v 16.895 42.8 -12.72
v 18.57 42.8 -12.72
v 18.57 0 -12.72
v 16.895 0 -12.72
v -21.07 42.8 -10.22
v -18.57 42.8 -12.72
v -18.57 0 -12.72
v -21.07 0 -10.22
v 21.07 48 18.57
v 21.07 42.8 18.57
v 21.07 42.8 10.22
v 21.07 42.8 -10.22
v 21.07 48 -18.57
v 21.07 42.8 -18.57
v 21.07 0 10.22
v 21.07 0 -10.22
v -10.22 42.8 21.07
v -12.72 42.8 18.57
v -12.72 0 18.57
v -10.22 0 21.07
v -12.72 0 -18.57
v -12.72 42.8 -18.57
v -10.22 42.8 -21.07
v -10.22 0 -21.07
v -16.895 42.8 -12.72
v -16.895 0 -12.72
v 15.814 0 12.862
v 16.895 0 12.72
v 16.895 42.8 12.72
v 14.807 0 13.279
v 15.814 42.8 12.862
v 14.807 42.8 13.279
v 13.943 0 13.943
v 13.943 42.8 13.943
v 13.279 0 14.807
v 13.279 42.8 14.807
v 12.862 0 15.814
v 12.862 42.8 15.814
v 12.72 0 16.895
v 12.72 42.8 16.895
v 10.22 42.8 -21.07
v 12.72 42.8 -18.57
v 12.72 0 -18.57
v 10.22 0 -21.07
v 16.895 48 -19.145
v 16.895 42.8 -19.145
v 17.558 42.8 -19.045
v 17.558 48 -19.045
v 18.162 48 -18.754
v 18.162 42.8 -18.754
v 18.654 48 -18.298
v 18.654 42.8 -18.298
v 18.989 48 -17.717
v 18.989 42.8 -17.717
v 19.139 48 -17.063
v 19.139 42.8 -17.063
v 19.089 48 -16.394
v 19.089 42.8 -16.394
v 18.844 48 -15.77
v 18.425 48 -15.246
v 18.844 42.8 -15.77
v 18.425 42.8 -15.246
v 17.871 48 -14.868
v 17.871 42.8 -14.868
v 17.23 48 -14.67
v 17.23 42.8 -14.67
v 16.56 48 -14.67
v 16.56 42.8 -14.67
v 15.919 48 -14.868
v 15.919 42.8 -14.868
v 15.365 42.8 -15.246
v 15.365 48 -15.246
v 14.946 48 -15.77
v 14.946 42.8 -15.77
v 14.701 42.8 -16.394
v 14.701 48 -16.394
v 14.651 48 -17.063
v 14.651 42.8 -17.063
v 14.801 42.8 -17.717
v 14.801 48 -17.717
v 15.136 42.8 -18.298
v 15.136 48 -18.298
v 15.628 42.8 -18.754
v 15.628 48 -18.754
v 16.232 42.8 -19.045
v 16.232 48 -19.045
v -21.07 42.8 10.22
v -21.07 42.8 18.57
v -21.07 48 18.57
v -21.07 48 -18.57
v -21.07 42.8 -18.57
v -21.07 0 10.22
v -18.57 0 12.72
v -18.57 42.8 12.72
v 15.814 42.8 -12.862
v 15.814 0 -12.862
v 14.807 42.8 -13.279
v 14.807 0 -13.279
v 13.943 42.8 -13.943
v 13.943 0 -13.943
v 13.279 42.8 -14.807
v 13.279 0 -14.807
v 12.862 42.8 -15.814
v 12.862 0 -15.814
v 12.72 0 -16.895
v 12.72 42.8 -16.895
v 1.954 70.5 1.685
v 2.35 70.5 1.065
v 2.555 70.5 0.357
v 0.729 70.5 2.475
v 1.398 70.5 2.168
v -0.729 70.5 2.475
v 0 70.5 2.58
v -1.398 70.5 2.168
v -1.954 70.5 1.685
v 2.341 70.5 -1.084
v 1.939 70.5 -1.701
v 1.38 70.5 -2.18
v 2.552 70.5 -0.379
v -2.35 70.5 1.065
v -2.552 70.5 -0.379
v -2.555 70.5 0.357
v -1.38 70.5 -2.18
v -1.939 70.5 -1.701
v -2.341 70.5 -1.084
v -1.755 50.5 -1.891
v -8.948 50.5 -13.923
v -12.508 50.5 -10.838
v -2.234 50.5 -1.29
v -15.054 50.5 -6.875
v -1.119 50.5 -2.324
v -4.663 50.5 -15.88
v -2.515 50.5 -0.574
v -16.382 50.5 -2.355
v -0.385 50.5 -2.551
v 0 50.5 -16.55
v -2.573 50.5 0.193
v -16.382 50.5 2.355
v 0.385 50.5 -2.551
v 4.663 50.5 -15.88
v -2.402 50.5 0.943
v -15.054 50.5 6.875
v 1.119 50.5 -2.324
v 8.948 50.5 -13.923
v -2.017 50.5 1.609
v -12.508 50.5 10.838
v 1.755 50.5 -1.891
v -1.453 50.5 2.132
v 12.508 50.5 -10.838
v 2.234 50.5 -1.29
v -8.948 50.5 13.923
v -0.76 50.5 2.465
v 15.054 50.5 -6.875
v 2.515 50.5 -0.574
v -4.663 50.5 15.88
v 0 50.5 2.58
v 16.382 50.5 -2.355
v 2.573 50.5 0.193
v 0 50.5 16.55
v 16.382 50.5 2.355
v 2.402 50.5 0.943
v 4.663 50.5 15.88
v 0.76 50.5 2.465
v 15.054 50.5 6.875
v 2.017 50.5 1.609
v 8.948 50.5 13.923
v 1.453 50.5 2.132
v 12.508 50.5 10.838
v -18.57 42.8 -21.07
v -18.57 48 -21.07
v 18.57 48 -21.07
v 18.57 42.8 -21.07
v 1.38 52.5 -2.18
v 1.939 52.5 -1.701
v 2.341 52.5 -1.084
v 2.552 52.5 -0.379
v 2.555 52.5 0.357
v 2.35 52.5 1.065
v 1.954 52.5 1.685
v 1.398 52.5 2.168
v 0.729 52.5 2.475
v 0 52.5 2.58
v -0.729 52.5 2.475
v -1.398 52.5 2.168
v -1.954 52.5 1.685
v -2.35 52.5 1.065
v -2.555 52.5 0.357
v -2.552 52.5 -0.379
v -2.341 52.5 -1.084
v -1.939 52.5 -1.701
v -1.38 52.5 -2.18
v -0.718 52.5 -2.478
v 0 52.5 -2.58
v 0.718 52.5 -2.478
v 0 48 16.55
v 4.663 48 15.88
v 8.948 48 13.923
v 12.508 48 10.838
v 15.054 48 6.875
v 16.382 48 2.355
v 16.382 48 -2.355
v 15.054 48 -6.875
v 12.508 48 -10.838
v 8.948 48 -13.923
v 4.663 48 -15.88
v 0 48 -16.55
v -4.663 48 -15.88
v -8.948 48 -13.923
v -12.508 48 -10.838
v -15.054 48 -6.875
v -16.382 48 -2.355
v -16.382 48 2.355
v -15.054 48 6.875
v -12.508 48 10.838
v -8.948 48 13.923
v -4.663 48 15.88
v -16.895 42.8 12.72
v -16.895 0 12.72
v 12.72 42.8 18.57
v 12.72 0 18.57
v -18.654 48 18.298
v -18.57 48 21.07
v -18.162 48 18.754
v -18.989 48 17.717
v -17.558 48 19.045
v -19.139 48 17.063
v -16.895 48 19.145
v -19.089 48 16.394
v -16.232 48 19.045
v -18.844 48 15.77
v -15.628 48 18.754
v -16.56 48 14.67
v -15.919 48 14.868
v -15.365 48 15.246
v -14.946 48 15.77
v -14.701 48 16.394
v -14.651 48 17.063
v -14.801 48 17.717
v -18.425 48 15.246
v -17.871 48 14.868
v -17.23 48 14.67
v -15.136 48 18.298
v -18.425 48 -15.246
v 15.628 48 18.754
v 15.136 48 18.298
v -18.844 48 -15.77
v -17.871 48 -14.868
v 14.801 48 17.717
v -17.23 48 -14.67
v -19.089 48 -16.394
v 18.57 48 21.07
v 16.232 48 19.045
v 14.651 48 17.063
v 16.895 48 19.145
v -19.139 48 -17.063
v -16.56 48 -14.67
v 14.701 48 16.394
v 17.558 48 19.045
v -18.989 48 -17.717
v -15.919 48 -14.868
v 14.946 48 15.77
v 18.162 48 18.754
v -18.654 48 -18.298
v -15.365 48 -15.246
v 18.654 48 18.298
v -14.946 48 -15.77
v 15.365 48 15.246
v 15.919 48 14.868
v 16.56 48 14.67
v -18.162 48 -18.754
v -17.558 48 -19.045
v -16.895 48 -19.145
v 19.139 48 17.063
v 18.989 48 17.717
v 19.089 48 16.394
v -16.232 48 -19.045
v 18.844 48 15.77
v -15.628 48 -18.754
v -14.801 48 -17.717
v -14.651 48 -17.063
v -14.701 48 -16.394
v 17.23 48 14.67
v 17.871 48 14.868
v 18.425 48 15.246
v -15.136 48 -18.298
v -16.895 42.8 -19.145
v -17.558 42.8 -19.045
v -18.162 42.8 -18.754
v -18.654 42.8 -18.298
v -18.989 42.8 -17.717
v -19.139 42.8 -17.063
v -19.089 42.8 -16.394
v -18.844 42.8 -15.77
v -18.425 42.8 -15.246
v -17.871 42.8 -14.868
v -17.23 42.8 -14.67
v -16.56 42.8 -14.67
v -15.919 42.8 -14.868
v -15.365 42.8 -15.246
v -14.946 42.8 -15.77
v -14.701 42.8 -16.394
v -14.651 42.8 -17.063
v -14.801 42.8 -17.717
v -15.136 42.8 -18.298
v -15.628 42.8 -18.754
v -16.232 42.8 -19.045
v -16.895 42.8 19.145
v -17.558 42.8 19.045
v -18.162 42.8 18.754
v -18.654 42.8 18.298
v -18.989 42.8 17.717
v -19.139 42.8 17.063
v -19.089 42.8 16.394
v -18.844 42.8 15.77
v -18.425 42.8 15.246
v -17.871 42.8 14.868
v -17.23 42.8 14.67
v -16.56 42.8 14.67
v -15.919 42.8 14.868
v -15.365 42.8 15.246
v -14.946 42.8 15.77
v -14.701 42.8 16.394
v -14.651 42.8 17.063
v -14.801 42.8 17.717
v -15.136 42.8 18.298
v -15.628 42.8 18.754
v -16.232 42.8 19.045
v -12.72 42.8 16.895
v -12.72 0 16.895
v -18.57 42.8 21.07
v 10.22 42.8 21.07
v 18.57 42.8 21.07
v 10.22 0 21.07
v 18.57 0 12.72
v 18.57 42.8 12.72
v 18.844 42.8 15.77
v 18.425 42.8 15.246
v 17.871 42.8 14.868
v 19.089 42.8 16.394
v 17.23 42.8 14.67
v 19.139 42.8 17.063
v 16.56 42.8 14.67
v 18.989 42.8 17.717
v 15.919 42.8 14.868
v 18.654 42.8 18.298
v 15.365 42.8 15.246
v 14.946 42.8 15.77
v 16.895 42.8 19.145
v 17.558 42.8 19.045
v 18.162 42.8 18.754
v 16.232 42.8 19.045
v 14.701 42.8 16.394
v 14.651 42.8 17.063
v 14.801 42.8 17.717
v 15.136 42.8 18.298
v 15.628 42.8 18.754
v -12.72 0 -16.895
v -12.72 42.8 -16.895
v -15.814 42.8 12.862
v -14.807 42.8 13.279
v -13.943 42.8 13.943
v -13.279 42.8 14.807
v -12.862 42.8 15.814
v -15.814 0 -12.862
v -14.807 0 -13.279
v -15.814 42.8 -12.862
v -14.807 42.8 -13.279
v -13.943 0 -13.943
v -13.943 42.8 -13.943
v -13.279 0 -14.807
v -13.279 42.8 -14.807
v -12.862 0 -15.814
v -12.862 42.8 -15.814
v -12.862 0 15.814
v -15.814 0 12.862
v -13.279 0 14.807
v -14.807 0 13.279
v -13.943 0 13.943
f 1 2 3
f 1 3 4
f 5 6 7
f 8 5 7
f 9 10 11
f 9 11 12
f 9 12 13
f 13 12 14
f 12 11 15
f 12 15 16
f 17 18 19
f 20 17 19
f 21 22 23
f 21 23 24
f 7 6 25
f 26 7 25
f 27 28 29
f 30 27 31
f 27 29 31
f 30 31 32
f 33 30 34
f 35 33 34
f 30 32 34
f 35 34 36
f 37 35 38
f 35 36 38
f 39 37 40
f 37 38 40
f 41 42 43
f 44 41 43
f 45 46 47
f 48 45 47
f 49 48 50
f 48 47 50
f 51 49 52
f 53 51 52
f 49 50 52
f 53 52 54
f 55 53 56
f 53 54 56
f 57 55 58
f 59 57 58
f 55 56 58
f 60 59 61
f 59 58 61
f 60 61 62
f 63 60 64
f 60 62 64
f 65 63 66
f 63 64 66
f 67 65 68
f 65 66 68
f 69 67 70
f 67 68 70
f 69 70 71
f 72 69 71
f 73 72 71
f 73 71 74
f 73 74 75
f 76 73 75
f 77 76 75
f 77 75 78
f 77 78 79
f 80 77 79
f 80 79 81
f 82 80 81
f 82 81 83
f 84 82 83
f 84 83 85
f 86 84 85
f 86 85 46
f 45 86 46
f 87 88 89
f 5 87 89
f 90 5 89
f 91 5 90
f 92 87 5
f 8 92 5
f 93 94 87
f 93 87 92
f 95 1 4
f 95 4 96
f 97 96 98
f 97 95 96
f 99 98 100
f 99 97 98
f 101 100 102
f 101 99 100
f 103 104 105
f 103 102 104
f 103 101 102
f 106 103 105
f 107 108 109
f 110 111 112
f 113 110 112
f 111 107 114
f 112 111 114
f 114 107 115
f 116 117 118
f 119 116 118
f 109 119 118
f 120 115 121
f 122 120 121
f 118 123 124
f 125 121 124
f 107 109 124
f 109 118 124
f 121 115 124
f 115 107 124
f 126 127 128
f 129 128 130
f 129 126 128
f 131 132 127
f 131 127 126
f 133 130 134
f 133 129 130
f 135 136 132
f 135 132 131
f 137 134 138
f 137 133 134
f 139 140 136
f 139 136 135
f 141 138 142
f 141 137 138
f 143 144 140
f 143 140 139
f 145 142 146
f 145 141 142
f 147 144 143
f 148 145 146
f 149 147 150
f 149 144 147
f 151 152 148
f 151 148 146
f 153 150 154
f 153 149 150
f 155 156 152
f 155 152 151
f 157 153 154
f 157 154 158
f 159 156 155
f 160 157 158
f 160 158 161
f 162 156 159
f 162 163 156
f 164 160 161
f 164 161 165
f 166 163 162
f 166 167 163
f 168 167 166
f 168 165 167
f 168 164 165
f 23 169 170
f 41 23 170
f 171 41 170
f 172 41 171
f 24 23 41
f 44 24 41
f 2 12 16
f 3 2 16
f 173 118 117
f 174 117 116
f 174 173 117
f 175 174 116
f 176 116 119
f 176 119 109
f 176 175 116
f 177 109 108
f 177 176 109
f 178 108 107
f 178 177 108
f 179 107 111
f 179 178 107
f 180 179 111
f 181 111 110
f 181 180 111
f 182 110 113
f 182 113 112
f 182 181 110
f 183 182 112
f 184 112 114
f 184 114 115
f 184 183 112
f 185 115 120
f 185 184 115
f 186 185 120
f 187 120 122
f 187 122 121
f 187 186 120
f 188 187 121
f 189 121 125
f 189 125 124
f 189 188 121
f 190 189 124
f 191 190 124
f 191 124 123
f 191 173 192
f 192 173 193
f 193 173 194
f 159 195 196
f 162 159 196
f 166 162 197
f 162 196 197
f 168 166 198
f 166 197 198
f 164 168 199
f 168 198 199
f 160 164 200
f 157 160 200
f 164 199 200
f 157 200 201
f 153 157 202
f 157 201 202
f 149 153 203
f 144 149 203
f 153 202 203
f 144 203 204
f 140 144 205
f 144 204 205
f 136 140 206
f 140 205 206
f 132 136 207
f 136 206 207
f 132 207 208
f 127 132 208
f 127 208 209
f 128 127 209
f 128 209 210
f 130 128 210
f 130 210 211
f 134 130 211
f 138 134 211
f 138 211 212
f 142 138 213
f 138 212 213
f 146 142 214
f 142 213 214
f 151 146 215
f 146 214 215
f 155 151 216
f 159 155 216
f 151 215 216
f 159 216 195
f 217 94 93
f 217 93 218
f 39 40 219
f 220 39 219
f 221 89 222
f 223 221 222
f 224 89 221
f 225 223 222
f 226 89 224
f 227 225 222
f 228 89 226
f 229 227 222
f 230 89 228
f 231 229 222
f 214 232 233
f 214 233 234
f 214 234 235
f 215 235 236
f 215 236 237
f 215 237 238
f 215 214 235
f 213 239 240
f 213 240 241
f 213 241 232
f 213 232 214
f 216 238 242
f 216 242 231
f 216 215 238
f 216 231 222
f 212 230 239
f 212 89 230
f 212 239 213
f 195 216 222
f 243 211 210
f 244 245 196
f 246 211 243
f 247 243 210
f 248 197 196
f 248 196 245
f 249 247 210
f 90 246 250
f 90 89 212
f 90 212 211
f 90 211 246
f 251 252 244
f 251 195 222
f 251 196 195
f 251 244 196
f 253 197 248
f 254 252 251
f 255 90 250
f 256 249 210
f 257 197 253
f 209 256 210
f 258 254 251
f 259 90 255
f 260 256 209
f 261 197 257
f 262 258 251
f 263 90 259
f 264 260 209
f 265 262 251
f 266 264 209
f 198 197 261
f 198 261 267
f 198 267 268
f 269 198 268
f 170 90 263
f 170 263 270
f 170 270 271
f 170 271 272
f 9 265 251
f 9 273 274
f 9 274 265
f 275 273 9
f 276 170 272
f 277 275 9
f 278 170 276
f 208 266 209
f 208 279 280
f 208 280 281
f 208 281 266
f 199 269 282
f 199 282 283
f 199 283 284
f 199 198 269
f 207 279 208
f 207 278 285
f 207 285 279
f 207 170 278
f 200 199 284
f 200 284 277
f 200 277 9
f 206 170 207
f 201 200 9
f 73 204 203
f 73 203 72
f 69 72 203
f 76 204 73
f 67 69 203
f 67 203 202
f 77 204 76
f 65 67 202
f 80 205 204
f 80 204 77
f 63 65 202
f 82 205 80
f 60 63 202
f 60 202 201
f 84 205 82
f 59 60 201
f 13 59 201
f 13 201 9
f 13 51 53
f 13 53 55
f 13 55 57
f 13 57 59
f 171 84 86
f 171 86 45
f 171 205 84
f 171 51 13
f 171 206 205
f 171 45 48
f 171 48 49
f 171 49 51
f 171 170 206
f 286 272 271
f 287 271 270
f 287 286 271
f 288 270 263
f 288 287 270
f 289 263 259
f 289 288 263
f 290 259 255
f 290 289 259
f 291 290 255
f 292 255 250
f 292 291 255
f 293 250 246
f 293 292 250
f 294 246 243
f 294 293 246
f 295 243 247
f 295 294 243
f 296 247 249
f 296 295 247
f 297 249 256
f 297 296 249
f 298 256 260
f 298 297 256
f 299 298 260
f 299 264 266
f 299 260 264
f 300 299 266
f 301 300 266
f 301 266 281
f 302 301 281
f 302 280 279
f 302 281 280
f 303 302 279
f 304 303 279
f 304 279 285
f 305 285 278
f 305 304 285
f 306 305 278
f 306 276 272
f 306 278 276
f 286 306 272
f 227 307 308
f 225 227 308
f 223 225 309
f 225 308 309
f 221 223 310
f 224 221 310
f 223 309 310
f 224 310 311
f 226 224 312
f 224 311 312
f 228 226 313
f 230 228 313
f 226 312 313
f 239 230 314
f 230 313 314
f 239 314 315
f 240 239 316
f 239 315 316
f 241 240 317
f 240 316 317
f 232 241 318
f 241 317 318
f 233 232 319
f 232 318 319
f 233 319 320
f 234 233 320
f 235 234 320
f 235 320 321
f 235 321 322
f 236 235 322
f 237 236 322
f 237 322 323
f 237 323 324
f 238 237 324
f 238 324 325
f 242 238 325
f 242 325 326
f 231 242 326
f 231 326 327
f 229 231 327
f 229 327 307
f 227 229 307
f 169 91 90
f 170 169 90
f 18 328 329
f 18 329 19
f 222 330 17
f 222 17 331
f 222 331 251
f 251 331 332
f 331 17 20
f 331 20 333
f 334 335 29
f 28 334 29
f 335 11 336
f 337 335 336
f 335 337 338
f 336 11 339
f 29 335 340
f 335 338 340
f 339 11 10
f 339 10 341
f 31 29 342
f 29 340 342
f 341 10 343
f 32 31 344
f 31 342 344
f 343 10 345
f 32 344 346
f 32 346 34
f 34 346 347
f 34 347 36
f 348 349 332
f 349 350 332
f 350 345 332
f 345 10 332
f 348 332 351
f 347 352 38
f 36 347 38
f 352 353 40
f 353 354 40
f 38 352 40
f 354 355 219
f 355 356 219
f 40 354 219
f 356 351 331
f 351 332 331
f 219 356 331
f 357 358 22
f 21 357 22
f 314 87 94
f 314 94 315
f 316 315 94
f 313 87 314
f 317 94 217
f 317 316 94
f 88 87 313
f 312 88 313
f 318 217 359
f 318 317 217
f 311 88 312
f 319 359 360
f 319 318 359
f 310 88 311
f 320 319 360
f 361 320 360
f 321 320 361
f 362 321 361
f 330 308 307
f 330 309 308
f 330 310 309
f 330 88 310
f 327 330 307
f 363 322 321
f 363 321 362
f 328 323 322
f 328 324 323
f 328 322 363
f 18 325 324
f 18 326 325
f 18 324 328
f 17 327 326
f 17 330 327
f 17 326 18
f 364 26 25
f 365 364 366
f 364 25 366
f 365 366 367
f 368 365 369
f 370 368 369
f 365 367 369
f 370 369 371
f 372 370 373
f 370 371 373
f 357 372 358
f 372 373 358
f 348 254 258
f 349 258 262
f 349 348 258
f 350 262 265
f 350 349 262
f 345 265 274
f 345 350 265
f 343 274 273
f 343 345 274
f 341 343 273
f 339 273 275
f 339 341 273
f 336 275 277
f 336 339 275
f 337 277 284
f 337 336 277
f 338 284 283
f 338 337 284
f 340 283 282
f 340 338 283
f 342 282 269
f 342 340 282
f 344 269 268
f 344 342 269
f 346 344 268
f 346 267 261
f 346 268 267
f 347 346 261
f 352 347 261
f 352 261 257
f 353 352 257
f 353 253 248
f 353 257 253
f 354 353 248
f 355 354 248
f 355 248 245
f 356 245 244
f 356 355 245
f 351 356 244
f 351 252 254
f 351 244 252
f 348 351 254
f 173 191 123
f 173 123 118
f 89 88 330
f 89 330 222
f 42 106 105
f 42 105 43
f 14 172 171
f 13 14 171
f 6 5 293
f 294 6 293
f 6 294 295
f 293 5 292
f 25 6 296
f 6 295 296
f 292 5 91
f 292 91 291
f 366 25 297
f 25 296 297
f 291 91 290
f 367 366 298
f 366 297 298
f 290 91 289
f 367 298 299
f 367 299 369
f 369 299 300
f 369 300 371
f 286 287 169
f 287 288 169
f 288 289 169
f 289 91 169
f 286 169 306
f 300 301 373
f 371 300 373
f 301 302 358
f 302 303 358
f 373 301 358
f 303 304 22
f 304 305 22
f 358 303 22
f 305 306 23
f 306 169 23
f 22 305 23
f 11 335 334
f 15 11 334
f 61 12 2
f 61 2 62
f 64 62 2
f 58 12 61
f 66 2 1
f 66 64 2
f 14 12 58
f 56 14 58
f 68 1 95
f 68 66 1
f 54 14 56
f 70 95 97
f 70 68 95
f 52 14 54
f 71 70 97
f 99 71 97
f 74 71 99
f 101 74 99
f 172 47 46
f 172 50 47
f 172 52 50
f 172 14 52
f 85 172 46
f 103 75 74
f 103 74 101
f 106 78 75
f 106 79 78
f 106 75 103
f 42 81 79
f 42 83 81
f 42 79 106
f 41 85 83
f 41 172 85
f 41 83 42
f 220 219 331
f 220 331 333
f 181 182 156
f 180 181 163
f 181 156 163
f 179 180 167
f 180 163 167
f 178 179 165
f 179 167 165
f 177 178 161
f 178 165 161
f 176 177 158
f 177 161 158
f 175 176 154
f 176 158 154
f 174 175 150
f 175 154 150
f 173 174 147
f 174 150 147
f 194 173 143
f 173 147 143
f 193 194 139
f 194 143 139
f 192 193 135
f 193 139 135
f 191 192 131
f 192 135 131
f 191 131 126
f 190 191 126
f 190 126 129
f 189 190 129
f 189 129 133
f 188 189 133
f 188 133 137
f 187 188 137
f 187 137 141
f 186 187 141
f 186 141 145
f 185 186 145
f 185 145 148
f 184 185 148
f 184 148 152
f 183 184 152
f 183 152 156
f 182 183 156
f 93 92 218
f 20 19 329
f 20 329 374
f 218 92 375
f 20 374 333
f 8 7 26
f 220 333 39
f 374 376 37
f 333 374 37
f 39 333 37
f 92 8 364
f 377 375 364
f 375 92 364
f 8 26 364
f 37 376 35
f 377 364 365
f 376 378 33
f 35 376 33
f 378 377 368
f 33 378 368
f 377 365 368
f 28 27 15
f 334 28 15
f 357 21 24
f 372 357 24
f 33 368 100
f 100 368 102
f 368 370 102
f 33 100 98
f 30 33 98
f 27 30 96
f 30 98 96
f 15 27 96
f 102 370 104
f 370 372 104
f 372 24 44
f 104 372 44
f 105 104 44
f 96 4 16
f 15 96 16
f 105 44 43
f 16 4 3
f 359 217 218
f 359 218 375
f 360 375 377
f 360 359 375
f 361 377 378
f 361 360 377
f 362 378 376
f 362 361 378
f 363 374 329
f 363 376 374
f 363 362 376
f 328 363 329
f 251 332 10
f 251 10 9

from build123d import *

# Parameters (mm, degrees)
CROQUIS1_W                                 = 42.14
CROQUIS1_H                                 = 42.14
SALIENTE_EXTRUIR1_DEPTH                    = 48
CORTAR_EXTRUIR1_DEPTH                      = 53.151029
SIMETR_A3_AT_THE_SECOND_PLANE_COPY_1_DEPTH = 53.151029
CHAFL_N1_SIZE                              = 2.5
CROQUIS3_R                                 = 2.25
CORTAR_EXTRUIR2_DEPTH                      = 53.151029
SIMETR_A4_AT_THE_SECOND_PLANE_COPY_1_SKE_R = 2.25
SIMETR_A4_AT_THE_SECOND_PLANE_COPY_1_DEPTH = 53.151029
CROQUIS4_R                                 = 16.55
SALIENTE_EXTRUIR2_DEPTH                    = 2.5
CROQUIS6_R                                 = 2.58
SALIENTE_EXTRUIR4_DEPTH                    = 2
SALIENTE_EXTRUIR5_DEPTH                    = 18
SALIENTE_EXTRUIR3_DEPTH                    = 20
CHAFL_N2_SIZE                              = 2.5


with BuildPart() as part:
    # Croquis1 → Saliente-Extruir1 (new body)
    with BuildSketch(Plane(origin=(0, 0, 0), x_dir=(1, 0, 0), z_dir=(0, 1, 0))):
        Rectangle(CROQUIS1_W, CROQUIS1_H)
    extrude(amount=SALIENTE_EXTRUIR1_DEPTH)

    # Croquis2 → Cortar-Extruir1 (cut, through all)
    with BuildSketch(Plane(origin=(0, 42.8, 0), x_dir=(1, 0, 0), z_dir=(0, 1, 0))):
        with BuildLine():
            Line((-21.07, 12.72), (-16.895, 12.72))
            ThreePointArc((-16.895, 12.72), (-13.942829, 13.942829), (-12.72, 16.895))
            Line((-12.72, 16.895), (-12.72, 21.07))
            Line((-12.72, 21.07), (-21.07, 21.07))
            Line((-21.07, 21.07), (-21.07, 12.72))
        make_face()
    cortar_extruir1 = extrude(amount=-CORTAR_EXTRUIR1_DEPTH, mode=Mode.SUBTRACT)

    # Simetría3: Cortar-Extruir1 across plane
    add(cortar_extruir1.mirror(Plane(origin=(0, 0, 0), x_dir=(0, 0, 1), z_dir=(1, 0, 0))), mode=Mode.SUBTRACT)

    # Simetría3 at the second plane: Cortar-Extruir1 across plane
    add(cortar_extruir1.mirror(Plane.XY), mode=Mode.SUBTRACT)

    # Simetría3 at the second plane copy 1 ske → Simetría3 at the second plane copy 1 (cut, through all)
    with BuildSketch(Plane(origin=(0, 42.8, 0), x_dir=(-1, 0, 0), z_dir=(0, 1, 0))):
        with BuildLine():
            Line((-21.07, 12.72), (-16.895, 12.72))
            ThreePointArc((-16.895, 12.72), (-13.942829, 13.942829), (-12.72, 16.895))
            Line((-12.72, 16.895), (-12.72, 21.07))
            Line((-12.72, 21.07), (-21.07, 21.07))
            Line((-21.07, 21.07), (-21.07, 12.72))
        make_face()
    extrude(amount=-SIMETR_A3_AT_THE_SECOND_PLANE_COPY_1_DEPTH, mode=Mode.SUBTRACT)

    # Chaflán1
    chafl_n1_edges = [part.edges().sort_by_distance(p)[0] for p in [
        (-21.07, 21.4, -12.72),
        (-12.72, 21.4, -21.07),
        (-21.07, 21.4, 12.72),
        (-12.72, 21.4, 21.07),
        (21.07, 21.4, -12.72),
        (12.72, 21.4, -21.07),
        (21.07, 21.4, 12.72),
        (12.72, 21.4, 21.07),
    ]]
    chamfer(chafl_n1_edges, length=CHAFL_N1_SIZE)

    # Croquis3 → Cortar-Extruir2 (cut, through all)
    with BuildSketch(Plane.XZ.offset(-42.8)):
        with Locations(Location((16.895, -16.895, 0), (0, 0, 270))):
            Circle(CROQUIS3_R)
    cortar_extruir2 = extrude(amount=-CORTAR_EXTRUIR2_DEPTH, mode=Mode.SUBTRACT)

    # Simetría4: Cortar-Extruir2 across plane
    add(cortar_extruir2.mirror(Plane(origin=(0, 0, 0), x_dir=(0, 0, 1), z_dir=(1, 0, 0))), mode=Mode.SUBTRACT)

    # Simetría4 at the second plane: Cortar-Extruir2 across plane
    add(cortar_extruir2.mirror(Plane.XY), mode=Mode.SUBTRACT)

    # Simetría4 at the second plane copy 1 ske → Simetría4 at the second plane copy 1 (cut, through all)
    with BuildSketch(Plane(origin=(0, 42.8, 0), x_dir=(-1, 0, 0), z_dir=(0, -1, 0))):
        with Locations(Location((16.895, -16.895, 0), (0, 0, 270))):
            Circle(SIMETR_A4_AT_THE_SECOND_PLANE_COPY_1_SKE_R)
    extrude(amount=-SIMETR_A4_AT_THE_SECOND_PLANE_COPY_1_DEPTH, mode=Mode.SUBTRACT)

    # Croquis4 → Saliente-Extruir2 (add)
    with BuildSketch(Plane(origin=(0, 48, 0), x_dir=(1, 0, 0), z_dir=(0, 1, 0))):
        with Locations(Location((0, 0, 0), (0, 0, 270))):
            Circle(CROQUIS4_R)
    extrude(amount=SALIENTE_EXTRUIR2_DEPTH)

    # Croquis6 → Saliente-Extruir4 (add)
    with BuildSketch(Plane(origin=(0, 50.5, 0), x_dir=(1, 0, 0), z_dir=(0, 1, 0))):
        with Locations(Location((0, 0, 0), (0, 0, 270))):
            Circle(CROQUIS6_R)
    extrude(amount=SALIENTE_EXTRUIR4_DEPTH)

    # Croquis7 → Saliente-Extruir5 (add)
    with BuildSketch(Plane(origin=(0, 52.5, 0), x_dir=(1, 0, 0), z_dir=(0, 1, 0))):
        with BuildLine():
            Line((-1.379855, 2.18), (1.379855, 2.18))
            ThreePointArc((1.379855, 2.18), (0, -2.58), (-1.379855, 2.18))
        make_face()
    extrude(amount=SALIENTE_EXTRUIR5_DEPTH)

    # Croquis5 → Saliente-Extruir3 (add)
    with BuildSketch(Plane(origin=(0, 50.5, 0), x_dir=(1, 0, 0), z_dir=(0, 1, 0))):
        with BuildLine():
            Line((-1.379855, 2.18), (1.379855, 2.18))
            ThreePointArc((1.379855, 2.18), (0, -2.58), (-1.379855, 2.18))
        make_face()
    extrude(amount=SALIENTE_EXTRUIR3_DEPTH)

    # Chaflán2
    chafl_n2_edges = [part.edges().sort_by_distance(p)[0] for p in [
        (-21.07, 45.4, -21.07),
        (21.07, 45.4, -21.07),
        (21.07, 45.4, 21.07),
        (-21.07, 45.4, 21.07),
    ]]
    chamfer(chafl_n2_edges, length=CHAFL_N2_SIZE)


solid = part.part
